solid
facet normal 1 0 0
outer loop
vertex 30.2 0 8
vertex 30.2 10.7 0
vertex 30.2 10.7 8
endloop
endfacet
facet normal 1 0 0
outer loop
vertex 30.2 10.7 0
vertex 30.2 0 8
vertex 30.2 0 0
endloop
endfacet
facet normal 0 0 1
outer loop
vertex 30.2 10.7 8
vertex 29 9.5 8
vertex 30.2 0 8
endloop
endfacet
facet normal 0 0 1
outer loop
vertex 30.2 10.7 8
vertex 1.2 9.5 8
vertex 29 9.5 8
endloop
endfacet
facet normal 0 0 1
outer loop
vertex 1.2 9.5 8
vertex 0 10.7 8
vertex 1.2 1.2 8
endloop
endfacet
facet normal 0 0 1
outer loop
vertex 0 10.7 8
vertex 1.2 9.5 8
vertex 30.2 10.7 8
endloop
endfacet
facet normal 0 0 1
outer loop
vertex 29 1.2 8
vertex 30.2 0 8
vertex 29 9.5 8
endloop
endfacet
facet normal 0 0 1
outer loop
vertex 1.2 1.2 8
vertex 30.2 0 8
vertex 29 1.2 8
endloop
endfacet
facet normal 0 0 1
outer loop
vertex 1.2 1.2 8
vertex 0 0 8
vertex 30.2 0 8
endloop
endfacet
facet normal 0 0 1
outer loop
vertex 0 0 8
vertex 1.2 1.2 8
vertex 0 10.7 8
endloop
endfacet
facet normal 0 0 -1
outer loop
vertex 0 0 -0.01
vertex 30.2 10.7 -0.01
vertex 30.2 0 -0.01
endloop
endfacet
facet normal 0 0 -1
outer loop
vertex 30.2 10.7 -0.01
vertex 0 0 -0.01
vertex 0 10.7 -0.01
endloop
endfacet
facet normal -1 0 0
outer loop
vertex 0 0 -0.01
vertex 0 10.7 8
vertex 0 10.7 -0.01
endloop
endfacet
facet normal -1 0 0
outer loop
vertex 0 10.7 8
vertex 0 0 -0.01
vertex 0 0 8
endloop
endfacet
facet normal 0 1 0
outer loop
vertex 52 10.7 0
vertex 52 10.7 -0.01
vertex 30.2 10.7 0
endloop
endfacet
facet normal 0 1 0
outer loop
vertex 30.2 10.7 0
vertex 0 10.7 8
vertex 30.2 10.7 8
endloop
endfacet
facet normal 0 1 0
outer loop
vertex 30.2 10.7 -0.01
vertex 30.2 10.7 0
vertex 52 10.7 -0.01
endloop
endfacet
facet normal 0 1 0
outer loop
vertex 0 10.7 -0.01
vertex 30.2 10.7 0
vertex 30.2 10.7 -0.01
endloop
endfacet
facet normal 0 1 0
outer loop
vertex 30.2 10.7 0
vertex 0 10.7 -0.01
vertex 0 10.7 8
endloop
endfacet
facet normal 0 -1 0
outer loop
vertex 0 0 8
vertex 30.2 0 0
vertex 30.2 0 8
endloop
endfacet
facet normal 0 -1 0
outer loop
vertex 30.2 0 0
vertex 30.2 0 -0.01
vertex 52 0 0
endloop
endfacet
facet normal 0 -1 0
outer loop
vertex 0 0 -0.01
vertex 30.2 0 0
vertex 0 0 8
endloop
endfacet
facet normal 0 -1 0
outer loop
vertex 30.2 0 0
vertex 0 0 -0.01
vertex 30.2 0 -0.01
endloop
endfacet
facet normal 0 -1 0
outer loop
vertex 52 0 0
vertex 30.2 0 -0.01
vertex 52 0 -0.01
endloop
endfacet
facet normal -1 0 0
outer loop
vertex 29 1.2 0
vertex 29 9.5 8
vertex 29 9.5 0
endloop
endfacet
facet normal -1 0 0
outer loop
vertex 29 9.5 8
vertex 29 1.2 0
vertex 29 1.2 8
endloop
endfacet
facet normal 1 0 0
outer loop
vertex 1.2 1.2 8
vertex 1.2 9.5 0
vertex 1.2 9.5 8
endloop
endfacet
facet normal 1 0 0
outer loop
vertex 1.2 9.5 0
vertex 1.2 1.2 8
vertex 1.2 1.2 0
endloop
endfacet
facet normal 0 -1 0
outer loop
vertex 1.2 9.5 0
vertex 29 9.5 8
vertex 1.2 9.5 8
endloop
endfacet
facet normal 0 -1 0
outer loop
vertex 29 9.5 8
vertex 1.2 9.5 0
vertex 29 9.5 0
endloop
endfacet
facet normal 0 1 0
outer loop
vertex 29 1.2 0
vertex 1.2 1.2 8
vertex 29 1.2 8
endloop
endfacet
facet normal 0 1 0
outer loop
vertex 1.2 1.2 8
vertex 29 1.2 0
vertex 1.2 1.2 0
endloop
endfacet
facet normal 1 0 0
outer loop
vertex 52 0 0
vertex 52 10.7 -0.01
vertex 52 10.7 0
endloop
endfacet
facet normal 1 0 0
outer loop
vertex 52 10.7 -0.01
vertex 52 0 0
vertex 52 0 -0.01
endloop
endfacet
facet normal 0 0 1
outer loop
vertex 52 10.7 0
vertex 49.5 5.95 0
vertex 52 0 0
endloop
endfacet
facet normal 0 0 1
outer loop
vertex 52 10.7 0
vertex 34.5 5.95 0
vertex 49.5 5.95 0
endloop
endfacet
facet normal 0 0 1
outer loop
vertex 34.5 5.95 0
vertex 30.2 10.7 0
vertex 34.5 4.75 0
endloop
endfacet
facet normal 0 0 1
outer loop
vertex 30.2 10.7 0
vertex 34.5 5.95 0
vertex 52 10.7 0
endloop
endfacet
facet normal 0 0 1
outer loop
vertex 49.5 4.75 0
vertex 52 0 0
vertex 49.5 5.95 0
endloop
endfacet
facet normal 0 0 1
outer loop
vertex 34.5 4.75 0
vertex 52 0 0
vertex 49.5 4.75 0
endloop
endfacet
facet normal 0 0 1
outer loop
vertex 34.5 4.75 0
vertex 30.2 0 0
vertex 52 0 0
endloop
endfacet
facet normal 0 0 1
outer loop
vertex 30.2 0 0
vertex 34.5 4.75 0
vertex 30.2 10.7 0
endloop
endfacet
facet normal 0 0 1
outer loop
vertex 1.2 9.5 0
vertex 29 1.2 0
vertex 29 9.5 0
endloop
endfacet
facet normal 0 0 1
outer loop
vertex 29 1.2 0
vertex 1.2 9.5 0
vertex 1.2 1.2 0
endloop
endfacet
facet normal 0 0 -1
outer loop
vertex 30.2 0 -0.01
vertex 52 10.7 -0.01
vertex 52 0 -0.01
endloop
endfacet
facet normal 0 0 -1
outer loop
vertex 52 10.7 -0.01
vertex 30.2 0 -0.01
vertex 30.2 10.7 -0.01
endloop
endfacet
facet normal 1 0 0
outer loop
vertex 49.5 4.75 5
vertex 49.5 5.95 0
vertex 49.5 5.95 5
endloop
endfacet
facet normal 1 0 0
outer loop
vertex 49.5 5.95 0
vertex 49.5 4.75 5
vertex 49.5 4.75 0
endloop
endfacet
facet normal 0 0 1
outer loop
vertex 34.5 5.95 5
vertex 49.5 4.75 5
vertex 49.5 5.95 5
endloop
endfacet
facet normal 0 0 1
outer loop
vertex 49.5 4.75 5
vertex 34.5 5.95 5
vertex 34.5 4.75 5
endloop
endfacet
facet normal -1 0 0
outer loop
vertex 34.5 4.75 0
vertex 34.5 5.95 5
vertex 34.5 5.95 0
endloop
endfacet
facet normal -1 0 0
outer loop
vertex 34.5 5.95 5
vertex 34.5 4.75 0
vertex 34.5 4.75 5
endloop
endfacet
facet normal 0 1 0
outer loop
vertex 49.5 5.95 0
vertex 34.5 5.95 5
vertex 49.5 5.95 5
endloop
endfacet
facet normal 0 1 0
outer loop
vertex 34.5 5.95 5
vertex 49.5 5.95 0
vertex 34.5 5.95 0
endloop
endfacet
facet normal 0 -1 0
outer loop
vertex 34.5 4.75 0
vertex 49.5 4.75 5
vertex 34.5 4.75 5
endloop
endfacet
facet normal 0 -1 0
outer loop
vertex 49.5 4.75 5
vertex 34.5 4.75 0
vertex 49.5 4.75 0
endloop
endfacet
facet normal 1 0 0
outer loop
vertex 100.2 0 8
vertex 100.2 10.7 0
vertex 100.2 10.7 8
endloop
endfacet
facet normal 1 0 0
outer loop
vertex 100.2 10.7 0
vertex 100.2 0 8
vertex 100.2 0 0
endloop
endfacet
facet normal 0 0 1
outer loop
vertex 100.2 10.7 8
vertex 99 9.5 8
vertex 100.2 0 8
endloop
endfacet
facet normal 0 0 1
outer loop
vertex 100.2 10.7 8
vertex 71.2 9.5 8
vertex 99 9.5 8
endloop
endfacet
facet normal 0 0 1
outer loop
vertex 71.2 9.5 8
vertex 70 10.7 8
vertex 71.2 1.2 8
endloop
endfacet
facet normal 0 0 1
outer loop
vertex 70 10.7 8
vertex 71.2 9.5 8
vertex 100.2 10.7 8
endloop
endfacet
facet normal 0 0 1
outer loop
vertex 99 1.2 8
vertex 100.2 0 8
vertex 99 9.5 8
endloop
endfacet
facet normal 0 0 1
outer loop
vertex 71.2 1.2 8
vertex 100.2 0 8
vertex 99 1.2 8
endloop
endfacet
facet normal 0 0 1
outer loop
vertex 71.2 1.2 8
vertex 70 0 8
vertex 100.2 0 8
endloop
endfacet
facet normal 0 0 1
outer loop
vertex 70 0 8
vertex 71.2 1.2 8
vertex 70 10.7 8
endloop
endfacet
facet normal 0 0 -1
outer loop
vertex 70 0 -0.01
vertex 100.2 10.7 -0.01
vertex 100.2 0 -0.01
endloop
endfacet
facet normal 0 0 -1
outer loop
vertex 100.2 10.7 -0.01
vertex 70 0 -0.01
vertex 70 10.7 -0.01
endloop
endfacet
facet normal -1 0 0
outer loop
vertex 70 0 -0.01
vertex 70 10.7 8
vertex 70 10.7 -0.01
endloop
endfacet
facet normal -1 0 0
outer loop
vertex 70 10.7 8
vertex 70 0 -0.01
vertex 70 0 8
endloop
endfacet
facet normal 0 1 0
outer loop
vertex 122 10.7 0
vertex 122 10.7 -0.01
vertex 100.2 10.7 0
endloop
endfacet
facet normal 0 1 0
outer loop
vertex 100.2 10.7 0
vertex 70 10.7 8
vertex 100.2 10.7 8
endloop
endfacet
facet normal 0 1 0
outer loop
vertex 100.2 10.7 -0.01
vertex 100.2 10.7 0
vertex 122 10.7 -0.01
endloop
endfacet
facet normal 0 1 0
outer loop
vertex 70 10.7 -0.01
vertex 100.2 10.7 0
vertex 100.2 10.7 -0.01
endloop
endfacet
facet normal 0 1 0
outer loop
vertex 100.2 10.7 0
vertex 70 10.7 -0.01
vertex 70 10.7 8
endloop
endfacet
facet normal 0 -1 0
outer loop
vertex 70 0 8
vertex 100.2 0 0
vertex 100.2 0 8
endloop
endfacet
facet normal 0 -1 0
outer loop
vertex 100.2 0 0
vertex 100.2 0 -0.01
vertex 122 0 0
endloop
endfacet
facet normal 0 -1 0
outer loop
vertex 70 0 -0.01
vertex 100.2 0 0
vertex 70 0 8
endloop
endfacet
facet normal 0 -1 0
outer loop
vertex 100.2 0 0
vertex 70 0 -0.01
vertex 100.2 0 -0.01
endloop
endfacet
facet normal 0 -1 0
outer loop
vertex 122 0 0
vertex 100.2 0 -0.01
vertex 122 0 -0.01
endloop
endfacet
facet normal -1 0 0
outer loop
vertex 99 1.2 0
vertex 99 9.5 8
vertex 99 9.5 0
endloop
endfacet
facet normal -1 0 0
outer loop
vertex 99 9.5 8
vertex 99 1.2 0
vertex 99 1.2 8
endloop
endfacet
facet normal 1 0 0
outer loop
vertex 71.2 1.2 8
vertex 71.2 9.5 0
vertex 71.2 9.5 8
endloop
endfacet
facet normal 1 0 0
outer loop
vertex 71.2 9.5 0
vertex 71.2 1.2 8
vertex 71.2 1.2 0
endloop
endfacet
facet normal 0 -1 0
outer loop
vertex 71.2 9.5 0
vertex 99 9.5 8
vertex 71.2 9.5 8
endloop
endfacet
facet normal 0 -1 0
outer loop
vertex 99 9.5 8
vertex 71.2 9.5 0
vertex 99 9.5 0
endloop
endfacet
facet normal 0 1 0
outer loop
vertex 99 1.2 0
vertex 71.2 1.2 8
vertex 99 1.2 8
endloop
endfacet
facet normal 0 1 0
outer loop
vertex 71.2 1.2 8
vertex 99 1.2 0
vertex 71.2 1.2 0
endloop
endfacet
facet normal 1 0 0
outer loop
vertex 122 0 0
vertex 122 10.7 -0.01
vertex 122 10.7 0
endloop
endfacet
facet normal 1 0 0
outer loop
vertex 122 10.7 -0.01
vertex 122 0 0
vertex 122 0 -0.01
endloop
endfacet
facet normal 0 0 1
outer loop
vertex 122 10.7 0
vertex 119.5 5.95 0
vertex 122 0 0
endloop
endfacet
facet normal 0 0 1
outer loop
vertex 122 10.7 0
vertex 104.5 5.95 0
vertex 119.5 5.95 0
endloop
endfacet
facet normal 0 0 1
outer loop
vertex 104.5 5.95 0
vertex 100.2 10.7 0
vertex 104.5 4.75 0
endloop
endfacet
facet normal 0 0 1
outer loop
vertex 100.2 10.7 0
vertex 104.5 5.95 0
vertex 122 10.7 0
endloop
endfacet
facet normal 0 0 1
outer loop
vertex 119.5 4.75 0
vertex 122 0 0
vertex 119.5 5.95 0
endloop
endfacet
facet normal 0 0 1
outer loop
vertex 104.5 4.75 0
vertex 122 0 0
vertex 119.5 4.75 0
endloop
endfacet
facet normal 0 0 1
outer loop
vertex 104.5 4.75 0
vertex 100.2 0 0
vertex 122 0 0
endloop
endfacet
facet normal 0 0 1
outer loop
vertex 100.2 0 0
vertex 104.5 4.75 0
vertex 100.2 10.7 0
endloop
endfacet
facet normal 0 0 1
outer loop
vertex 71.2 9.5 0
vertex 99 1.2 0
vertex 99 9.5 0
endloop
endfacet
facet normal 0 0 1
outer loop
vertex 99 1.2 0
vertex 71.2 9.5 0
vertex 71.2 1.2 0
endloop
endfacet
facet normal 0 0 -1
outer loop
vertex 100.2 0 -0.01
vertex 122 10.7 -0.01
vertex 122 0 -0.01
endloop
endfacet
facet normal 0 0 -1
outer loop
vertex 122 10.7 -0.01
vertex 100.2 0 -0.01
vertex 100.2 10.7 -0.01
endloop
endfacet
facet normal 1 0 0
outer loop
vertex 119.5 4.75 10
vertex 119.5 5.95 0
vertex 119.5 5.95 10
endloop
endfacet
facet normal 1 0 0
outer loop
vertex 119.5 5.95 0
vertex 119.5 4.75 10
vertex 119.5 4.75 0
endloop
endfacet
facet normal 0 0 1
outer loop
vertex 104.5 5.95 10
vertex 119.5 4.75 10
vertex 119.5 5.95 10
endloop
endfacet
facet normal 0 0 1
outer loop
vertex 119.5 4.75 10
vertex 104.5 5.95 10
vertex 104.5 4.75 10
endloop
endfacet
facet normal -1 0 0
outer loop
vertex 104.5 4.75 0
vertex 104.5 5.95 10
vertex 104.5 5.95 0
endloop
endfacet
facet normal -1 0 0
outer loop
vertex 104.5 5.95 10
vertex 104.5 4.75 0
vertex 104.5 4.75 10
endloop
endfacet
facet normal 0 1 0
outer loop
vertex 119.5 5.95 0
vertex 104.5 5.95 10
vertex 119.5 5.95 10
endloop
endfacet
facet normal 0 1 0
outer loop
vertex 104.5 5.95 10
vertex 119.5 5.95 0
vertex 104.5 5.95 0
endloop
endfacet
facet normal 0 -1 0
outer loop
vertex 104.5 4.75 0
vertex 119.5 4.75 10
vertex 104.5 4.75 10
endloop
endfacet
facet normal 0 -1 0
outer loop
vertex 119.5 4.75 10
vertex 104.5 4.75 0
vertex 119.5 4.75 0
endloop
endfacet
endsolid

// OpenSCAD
// file: ../../Base/Boxes.scad
// Fischertechnik Box Foundation
// Pre-designed Boxes

use <Constants.scad>

include <PlacementOptions.scad>

box190Width = 190;
box190Depth = 130;
box130Width = 130;
box130Depth = 95;
boxUsageHeight = 33.9;
boxWallThickness = 2.4;
boxBaseThickness = 1.0;
boxWebWidth = 3.0;

// getBoxWallThickness()
// Gets the wall thickness of a Fischertechnik Box

function getBoxWallThickness() = boxWallThickness;

// Gets the usable height of a fischertechnik box
function getBoxUsageHeight() = boxUsageHeight;

// Gets the thickness of the Fischertechnik box base.
function getBoxBaseThickness() = boxBaseThickness;

// Gets the width of a box web
function getBoxWebWidth() = boxWebWidth;

// Gets the usable inner space of a Box 190 as an x/y-list
function getBox190Space() = [
    box190Width - 2*getBoxWallThickness(), 
    box190Depth - 2*getBoxWallThickness() ];

// Imports the Fischertechnik empty box 130x190 mm and places it at position 0,0
// 190x130 are the outer sizes, the inner space is slightly smaller. Use getBox190Space() to get the inner sizes.
// This module needs the STL file "Fischertechnik Box 130x190.stl" in the library path.
// The box is positioned that the usable inner space is at the 0,0,0 position. The

module Box190() {
    translate([-getBoxWallThickness(),-getBoxWallThickness(),-getBoxBaseThickness()])
        import("Fischertechnik Box 130x190.stl", convexity=3);
}

// Gets the usable inner space of a Box 130 as an x/y-list
function getBox130Space() = [
    box130Width - 2*getBoxWallThickness(), 
    box130Depth - 2*getBoxWallThickness() ];

// Imports the Fischertechnik empty box 95x130 mm and places it at position 0,0
// 190x130 are the outer sizes, the inner space is slightly smaller. Use getBox190Space() to get the inner sizes.
// This module needs the STL file "Fischertechnik Box 95x130.stl" in the library path.
// The box is positioned that the usable inner space is at the 0,0,0 position. The

module Box130() {
    translate([-getBoxWallThickness(),-getBoxWallThickness(),-getBoxBaseThickness()])
        import("Fischertechnik Box 95x130.stl", convexity=3);
}

// Creates a web at the specified box walls
// corner 0 = LowerLeft, 1 = UpperLeft, 2 = UpperRight, 3 = LowerRight
// side 0 = LeftOfCorner, 1 = RightOfCorner
// distance = Distance in mm from the corner
// boxSpace = inner width and depth of the box (default: Box 190)
// webWidth = length of the web (default is 3 mms)
// webThickness = thickness of the web (default is 1 mm)

module BoxWeb(corner, side, distance, boxSpace=getBox190Space(), webWidth=getBoxWebWidth(), webThickness=1.0) {
    sink = getBoxWallThickness()/2;

    width = (corner % 2 == 0) ? 
            (side == LeftOfCorner ? webWidth : webThickness) :
            (side == LeftOfCorner ? webThickness : webWidth);

    depth = (corner % 2 == 0) ? 
            (side == RightOfCorner ? webWidth : webThickness) :
            (side == RightOfCorner ? webThickness : webWidth);
    
    xDiff = corner == LowerLeft ? 
                (side == LeftOfCorner ? -sink : distance) :
            (corner == UpperLeft ?                
                (side == LeftOfCorner ? distance : -sink) :
            (corner == UpperRight ?
                (side == LeftOfCorner ? boxSpace.x-webWidth+sink : boxSpace.x-distance-webThickness) :
                (side == LeftOfCorner ? boxSpace.x-distance-webThickness: boxSpace.x-webWidth+sink)));

    yDiff = corner == LowerLeft ? 
                (side == RightOfCorner ? -sink : distance) :
            (corner == UpperLeft ?
                (side == RightOfCorner ? boxSpace.y-distance : boxSpace.y-webWidth+sink) :
            (corner == UpperRight ?
                (side == RightOfCorner ? boxSpace.y-webWidth+sink : boxSpace.y-distance) :
                (side == RightOfCorner ? distance : -sink)));
    
    translate([xDiff, yDiff, -getExcess()])
        cube([width, depth, boxUsageHeight + 2*getExcess()]);
}
// file: ../../Base/Rotation.scad
// Fischertechnik Box Foundation
// Geometry Helpers Rotation

include <PlacementOptions.scad>

// getRotatedSpace(space, rotation=NoRotation)
// Rotates the space dependent on the specified rotation

function getRotatedSpace(space, rotation=NoRotation) = [
    (rotation == Rotate90 || rotation == Rotate270) ? space.y : space.x,
    (rotation == Rotate90 || rotation == Rotate270) ? space.x : space.y
];

// Rotates the given space around the fixed left lower corner
// space = the space the children needs as width/depth list [width,depth]
// rotation = 0 Rotate0 degrees, 1 Rotate90 degrees, 2 Rotate180 degrees, 3 Rotate270 degrees (equivalent to -90)

module RotateFix(space, rotation=Rotate0) {
    dy = (rotation == Rotate0 || rotation == Rotate270) ? 0 :
        (rotation == Rotate90) ? space.x :
        space.y;
    dx = (rotation < Rotate180) ? 0 :
        (rotation == Rotate180) ? space.x :
        space.y;
    
    translate([dx, dy, 0])
        rotate([0, 0, rotations[rotation]])
            children();
}
// file: ../../Base/Alignment.scad
// Fischertechnik Box Foundation
// Geometry Helpers Alignment

include <PlacementOptions.scad>

// getAlignedX(elementWidth, spaceWidth, align=AlignRight, offset=0)
// Gets the aligned X offset of an element with the given
// width in the given space.
// elementWidth = The width of the element to positon
// spaceWidth = The space where the element should be aligned
// align = 0 AlignLeft, 1 AlignCenter, 2 AlignRight
// offset = an optional offset from the aligned position. When
// aligned left or centered, then positive values are in X direction.
// When aligned right then positive values are in negative X direction.

function getAlignedX(elementWidth, spaceWidth, align=AlignRight, offset=0) =
    (align == AlignLeft) ?
        offset :
        ((align == AlignCenter) ?
        (spaceWidth - elementWidth)/2 + offset :
        spaceWidth - offset - elementWidth);

// getAlignedY(elementDepth, spaceDepth, align=AlignTop, offset=0)
// Gets the aligned Y offset of an element with the given
// depth in the given space.
// elementDepth = The depth of the element to positon
// spaceDepth = The space where the element should be aligned
// align = 0 AlignBottom, 1 AlignCenter, 2 AlignTop
// offset = an optional offset from the aligned position. When
// aligned bottom or centered, then positive values are in Y direction.
// When aligned top then positive values are in negative Y direction.

function getAlignedY(elementDepth, spaceDepth, align=AlignTop, offset=0) =
    (align == AlignBottom) ?
        offset :
        ((align == AlignCenter) ?
        (spaceDepth - elementDepth)/2 + offset :
        spaceDepth - offset - elementDepth);
// file: ../../Base/PlacementOptions.scad
// Fischertechnik Box Foundation
// Placement Options

// Alignment
NoAlign = 0;
AlignLeft = 1;
AlignBottom = 2;
AlignCenter = 3;
AlignRight = 4;
AlignTop = 5;

// Element rotation degree steps
rotations = [0, -90, -180, -270];

// Rotation
NoRotation = 0;
Rotate0 = 0;
Rotate90 = 1;
Rotate180 = 2;
Rotate270 = 3;

// Docking (seen from above)
NoDock = -1;
DockLeft = 0;
DockTop = 1;
DockRight = 2;
DockCorner = 2;
DockBottom = 3;

// Web corners
LowerLeft = 0;
UpperLeft = 1;
UpperRight = 2;
LowerRight = 3;

// Web position relative to corner
LeftOfCorner = 0;
RightOfCorner = 1;
// file: ../../Base/Placement.scad
// Fischertechnik Box Foundation
// Geometry Helpers Placement

use <Constants.scad>
use <Alignment.scad>
use <Rotation.scad>
use <Boxes.scad>

include <PlacementOptions.scad>

// Place(x=0, y=0, elementSpace=[0,0], alignX=AlignLeft, alignY=AlignBottom, rotation=Rotate0, boxSpace=getBox190Space())
// Places the child at the specified position
// y = Y-Position. This is a relative position when an X aligment is specified.
// x = X-Position. This is a relative position when an Y aligment is specified.
// elementSpace = space of the element to be placed [x,y]
// alignX = -1=NoAlign, 0 AlignLeft, 1 AlignCenter, 3 AlignRight (elementSpace and boxSpace required!)
// alignY = -1=NoAlign, 2 AlignBottom, 1 AlignCenter, 4 AlignTop (elementSpace and boxSpace required!)
// rotation = 0 Rotate0 0 degrees, 1 Rotate90 90 degrees, 
// 2 Rotate180 180 degrees, 3 Rotate270 270 degrees (equivalent to -90)
// boxSpace = Inner space of the box where the placement occurs [x,y] - default is Box 190x130 inner space

module Place(x=0, y=0, elementSpace=[0,0], 
  alignX=AlignLeft, alignY=AlignBottom, 
  rotation=NoRotation, boxSpace=getBox190Space()) {

    module Position(x, y, space, rotation=Rotate0) {
        translate([x, y, 0])
            RotateFix(space, rotation)
                children();
    }

    space = getRotatedSpace(elementSpace, rotation);
    alignedX = getAlignedX(space.x, boxSpace.x, alignX, x);
    alignedY = getAlignedY(space.y, boxSpace.y, alignY, y);
    Position(alignedX, alignedY, elementSpace, rotation)
        children();
}

// Center(space=getBox130Space(), elementSpace=[0,0])
// space = Space where the children is centered. For cylinder use centered=true and no elementSpace.
// elementSpace = space of the element to be centered [x,y]

module Center(space=getBox190Space(), elementSpace=[0,0]) {
    Place(elementSpace=elementSpace, boxSpace=space, alignX=AlignCenter, alignY=AlignCenter)
        children();
}

// CenterHorizontal(width=0, y=0, offset=0, space=getBox130Space())
// width = Width of the element to be placed.
// y = Y position of the element
// offset = Offset from the center position (negative will be left of the center)
// space = Space where the element is placed

module CenterHorizontal(width=0, y=0, offset=0, space=getBox190Space()) {
    Place(x=offset, y=y, elementSpace=[width, 0], boxSpace=space, alignX=AlignCenter)
        children(0);
}

// CenterVertical(depth=0, x=0, offset=0, space=getBox130Space())
// depth = Depth of the element to be placed.
// x = X position of the element
// offset = Offset from the center position (negative will be down of the center)
// space = Space where the element is placed

module CenterVertical(depth=0, x=0, offset=0, space=getBox190Space()) {
    Place(x=x, y=offset, elementSpace=[0, depth], boxSpace=space, alignY=AlignCenter)
        children(0);
}

// getIsVertical(align)
// True if the specified alignment needs a vertical orientation for a divider (AlignRight, AlignLeft)

function getIsVertical(align) = (align == AlignRight || align == AlignLeft);

// getIsHorizontal(align)
// True if the specified alignment needs a horizontal orientation for a divider (AlignTop, AlignBottom)

function getIsHorizontal(align) = (align == AlignTop || align == AlignBottom);
// file: ../../Base/Constants.scad
// Fischertechnik Box Foundation
// Constants

// Constant values necessary for multiple elements

// Base constants
dividerThickness = 1.2;
excess = 0.01;
fragments = 90;
tolerance = 0.8;

// Gets the thickness of a divider 
function getDividerThickness() = dividerThickness;

// Gets the excess that is used to merge walls into each other
function getExcess() = excess;

// Gets amount of fragments of a cylinder
function getFragments() = fragments;

// Gets the inner tolerance of a frame to each side
function getTolerance() = tolerance;


// Fischertechnik specific constants
axisDiameter = 4;
axisBottomDiameter = axisDiameter + 1;
standardEdgeDistance = 2.5;
standardWebDistance = 11.5;
standardCornerLength = 15;
tubeWallFactor = 0.8;
smallPartsFrameHeight = 20;

// Gets axis diameter
function getAxisDiameter() = axisDiameter;

// Gets axis bottom diameter for thicker part at the bottom
function getAxisBottomDiameter() = axisBottomDiameter;

// gets the standard distance to the wall of the box for dockable frames with webs
function getStandardEdgeDistance() = standardEdgeDistance;

// gets the standard distance of each web to the corner of the dockable frame
function getStandardWebDistance() = standardWebDistance;

// gets the standard length of the corner walls of a dockable frame
function getStandardCornerLength() = standardCornerLength;

// gets the wall thickness of a tube.
function getTubeWallThickness() = tubeWallFactor * getDividerThickness();

// gets the frame height for docked small parts boxes.
function getSmallPartsFrameHeight() = smallPartsFrameHeight;
// main file
// Fischertechnik Box Foundation
// ModelBase
// Test FrameBracket

use <../../Base/Constants.scad>
use <../../ModelBase/Complex.scad>

FrameBracket([15, getDividerThickness(), 5]);

translate([70,0])
    FrameBracket([15, getDividerThickness(), 10]);
